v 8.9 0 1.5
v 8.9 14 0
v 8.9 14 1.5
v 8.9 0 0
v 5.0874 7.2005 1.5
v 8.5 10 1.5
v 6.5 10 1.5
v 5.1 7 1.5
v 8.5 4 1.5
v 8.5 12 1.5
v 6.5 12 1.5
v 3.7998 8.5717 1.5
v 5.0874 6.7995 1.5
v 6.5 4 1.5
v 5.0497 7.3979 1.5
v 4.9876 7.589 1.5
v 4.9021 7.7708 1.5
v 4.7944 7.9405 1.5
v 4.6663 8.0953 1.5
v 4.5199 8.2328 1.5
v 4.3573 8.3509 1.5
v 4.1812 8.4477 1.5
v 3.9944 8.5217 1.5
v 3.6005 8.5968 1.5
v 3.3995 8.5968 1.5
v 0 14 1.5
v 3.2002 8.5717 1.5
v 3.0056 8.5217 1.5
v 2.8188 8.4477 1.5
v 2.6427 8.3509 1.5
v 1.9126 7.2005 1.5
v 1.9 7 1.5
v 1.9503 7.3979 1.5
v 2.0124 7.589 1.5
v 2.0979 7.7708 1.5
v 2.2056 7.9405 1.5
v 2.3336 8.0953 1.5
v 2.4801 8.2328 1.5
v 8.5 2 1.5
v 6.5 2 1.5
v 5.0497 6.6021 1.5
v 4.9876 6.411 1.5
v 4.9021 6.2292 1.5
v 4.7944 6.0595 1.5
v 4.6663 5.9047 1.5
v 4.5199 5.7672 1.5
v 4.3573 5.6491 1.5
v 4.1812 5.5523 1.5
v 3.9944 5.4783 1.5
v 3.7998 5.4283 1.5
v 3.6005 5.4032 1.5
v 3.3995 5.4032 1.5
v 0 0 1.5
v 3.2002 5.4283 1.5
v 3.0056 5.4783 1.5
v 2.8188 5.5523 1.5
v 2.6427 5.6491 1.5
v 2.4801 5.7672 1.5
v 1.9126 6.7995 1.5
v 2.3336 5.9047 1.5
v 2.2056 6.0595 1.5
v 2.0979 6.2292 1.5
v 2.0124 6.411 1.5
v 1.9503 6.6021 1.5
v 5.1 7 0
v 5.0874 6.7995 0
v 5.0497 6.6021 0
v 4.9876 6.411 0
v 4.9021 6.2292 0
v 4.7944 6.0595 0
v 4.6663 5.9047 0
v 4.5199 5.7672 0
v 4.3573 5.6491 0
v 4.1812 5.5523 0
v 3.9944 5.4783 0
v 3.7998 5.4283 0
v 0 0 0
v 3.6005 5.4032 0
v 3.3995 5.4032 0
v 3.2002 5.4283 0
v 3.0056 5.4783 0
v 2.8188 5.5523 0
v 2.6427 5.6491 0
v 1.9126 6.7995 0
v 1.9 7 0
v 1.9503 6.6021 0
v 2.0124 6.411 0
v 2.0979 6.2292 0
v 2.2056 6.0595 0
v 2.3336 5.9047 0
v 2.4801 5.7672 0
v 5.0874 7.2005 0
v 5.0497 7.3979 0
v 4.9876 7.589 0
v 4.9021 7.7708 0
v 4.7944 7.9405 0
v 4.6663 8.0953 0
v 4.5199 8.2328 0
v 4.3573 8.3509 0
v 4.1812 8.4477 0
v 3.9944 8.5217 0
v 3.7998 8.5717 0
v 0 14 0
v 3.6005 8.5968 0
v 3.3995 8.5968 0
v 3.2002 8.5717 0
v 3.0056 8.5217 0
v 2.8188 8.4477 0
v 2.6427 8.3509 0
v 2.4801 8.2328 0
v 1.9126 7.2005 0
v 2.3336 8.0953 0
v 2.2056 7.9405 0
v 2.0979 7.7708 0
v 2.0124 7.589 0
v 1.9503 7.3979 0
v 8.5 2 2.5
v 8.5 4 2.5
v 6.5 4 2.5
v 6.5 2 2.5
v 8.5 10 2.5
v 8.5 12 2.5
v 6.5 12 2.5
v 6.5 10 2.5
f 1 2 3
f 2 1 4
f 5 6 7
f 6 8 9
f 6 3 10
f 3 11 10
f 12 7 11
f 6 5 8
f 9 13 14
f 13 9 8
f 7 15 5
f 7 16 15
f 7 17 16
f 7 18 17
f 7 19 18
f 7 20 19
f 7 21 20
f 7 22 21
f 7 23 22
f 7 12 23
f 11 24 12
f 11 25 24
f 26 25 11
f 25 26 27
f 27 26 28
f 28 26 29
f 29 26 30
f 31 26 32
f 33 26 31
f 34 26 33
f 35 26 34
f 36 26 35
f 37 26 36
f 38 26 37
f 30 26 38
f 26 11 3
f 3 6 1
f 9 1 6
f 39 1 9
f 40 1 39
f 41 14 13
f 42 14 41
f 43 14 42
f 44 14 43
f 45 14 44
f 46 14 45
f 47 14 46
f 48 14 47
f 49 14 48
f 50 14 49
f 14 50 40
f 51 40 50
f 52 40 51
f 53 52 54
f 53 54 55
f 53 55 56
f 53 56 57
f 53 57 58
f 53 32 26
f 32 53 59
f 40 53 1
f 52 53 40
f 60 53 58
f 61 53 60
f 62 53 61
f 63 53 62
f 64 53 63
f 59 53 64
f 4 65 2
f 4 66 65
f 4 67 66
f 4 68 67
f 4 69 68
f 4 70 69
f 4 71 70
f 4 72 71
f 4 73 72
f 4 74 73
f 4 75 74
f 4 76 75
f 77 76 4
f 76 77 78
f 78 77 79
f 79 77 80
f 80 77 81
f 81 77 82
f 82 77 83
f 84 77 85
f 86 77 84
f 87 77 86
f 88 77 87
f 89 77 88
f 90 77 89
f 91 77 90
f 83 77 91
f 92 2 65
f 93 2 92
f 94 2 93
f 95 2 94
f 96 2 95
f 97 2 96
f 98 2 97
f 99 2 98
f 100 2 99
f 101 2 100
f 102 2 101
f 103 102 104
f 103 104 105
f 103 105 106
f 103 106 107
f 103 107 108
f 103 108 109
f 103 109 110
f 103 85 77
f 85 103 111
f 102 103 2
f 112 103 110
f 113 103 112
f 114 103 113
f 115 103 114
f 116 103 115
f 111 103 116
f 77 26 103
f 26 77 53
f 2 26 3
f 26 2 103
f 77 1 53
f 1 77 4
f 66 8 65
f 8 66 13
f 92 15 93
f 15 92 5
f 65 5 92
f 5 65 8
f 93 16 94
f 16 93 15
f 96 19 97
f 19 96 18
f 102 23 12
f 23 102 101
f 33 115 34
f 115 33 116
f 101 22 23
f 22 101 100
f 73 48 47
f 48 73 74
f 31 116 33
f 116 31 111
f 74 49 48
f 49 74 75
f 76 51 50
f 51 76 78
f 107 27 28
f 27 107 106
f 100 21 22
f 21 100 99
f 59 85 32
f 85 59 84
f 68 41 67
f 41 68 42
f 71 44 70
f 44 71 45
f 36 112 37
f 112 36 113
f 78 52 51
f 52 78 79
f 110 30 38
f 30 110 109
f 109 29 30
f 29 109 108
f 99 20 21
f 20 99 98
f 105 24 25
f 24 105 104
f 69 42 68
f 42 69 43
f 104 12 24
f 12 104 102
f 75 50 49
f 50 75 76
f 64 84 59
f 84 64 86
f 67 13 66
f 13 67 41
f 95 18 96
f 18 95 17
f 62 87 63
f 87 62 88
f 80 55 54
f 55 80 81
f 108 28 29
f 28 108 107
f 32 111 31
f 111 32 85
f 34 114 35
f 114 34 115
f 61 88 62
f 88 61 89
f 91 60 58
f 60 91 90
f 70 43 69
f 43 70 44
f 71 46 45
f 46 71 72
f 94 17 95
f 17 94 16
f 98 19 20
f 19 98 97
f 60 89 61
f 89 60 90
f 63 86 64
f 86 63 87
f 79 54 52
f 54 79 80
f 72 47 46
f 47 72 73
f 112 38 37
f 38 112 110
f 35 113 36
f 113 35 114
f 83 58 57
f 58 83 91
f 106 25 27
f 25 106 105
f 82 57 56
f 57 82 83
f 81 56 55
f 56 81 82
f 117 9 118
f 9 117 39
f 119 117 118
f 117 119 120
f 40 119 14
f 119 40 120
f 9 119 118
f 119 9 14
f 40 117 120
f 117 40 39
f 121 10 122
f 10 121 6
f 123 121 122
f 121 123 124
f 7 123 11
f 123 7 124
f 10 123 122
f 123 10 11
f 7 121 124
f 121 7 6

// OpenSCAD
// file: ../../lib/prusa_enclosure/washer.scad
module prusa_enclosure_mount_washer() {
    difference() {
        // Base
        cube([8.9, 14, 1.5]);

        // Through screw hole
        translate([3.5, 7, -1])
        cylinder(h=3.5, d=3.2, $fn=50);
    }
    
    translate([7.5, 3, 2])
    cube([2, 2, 1], center=true);
    
    translate([7.5, 11, 2])
    cube([2, 2, 1], center=true);
}

prusa_enclosure_mount_washer();
// main file
use <../../lib/prusa_enclosure/washer.scad>

prusa_enclosure_mount_washer();
